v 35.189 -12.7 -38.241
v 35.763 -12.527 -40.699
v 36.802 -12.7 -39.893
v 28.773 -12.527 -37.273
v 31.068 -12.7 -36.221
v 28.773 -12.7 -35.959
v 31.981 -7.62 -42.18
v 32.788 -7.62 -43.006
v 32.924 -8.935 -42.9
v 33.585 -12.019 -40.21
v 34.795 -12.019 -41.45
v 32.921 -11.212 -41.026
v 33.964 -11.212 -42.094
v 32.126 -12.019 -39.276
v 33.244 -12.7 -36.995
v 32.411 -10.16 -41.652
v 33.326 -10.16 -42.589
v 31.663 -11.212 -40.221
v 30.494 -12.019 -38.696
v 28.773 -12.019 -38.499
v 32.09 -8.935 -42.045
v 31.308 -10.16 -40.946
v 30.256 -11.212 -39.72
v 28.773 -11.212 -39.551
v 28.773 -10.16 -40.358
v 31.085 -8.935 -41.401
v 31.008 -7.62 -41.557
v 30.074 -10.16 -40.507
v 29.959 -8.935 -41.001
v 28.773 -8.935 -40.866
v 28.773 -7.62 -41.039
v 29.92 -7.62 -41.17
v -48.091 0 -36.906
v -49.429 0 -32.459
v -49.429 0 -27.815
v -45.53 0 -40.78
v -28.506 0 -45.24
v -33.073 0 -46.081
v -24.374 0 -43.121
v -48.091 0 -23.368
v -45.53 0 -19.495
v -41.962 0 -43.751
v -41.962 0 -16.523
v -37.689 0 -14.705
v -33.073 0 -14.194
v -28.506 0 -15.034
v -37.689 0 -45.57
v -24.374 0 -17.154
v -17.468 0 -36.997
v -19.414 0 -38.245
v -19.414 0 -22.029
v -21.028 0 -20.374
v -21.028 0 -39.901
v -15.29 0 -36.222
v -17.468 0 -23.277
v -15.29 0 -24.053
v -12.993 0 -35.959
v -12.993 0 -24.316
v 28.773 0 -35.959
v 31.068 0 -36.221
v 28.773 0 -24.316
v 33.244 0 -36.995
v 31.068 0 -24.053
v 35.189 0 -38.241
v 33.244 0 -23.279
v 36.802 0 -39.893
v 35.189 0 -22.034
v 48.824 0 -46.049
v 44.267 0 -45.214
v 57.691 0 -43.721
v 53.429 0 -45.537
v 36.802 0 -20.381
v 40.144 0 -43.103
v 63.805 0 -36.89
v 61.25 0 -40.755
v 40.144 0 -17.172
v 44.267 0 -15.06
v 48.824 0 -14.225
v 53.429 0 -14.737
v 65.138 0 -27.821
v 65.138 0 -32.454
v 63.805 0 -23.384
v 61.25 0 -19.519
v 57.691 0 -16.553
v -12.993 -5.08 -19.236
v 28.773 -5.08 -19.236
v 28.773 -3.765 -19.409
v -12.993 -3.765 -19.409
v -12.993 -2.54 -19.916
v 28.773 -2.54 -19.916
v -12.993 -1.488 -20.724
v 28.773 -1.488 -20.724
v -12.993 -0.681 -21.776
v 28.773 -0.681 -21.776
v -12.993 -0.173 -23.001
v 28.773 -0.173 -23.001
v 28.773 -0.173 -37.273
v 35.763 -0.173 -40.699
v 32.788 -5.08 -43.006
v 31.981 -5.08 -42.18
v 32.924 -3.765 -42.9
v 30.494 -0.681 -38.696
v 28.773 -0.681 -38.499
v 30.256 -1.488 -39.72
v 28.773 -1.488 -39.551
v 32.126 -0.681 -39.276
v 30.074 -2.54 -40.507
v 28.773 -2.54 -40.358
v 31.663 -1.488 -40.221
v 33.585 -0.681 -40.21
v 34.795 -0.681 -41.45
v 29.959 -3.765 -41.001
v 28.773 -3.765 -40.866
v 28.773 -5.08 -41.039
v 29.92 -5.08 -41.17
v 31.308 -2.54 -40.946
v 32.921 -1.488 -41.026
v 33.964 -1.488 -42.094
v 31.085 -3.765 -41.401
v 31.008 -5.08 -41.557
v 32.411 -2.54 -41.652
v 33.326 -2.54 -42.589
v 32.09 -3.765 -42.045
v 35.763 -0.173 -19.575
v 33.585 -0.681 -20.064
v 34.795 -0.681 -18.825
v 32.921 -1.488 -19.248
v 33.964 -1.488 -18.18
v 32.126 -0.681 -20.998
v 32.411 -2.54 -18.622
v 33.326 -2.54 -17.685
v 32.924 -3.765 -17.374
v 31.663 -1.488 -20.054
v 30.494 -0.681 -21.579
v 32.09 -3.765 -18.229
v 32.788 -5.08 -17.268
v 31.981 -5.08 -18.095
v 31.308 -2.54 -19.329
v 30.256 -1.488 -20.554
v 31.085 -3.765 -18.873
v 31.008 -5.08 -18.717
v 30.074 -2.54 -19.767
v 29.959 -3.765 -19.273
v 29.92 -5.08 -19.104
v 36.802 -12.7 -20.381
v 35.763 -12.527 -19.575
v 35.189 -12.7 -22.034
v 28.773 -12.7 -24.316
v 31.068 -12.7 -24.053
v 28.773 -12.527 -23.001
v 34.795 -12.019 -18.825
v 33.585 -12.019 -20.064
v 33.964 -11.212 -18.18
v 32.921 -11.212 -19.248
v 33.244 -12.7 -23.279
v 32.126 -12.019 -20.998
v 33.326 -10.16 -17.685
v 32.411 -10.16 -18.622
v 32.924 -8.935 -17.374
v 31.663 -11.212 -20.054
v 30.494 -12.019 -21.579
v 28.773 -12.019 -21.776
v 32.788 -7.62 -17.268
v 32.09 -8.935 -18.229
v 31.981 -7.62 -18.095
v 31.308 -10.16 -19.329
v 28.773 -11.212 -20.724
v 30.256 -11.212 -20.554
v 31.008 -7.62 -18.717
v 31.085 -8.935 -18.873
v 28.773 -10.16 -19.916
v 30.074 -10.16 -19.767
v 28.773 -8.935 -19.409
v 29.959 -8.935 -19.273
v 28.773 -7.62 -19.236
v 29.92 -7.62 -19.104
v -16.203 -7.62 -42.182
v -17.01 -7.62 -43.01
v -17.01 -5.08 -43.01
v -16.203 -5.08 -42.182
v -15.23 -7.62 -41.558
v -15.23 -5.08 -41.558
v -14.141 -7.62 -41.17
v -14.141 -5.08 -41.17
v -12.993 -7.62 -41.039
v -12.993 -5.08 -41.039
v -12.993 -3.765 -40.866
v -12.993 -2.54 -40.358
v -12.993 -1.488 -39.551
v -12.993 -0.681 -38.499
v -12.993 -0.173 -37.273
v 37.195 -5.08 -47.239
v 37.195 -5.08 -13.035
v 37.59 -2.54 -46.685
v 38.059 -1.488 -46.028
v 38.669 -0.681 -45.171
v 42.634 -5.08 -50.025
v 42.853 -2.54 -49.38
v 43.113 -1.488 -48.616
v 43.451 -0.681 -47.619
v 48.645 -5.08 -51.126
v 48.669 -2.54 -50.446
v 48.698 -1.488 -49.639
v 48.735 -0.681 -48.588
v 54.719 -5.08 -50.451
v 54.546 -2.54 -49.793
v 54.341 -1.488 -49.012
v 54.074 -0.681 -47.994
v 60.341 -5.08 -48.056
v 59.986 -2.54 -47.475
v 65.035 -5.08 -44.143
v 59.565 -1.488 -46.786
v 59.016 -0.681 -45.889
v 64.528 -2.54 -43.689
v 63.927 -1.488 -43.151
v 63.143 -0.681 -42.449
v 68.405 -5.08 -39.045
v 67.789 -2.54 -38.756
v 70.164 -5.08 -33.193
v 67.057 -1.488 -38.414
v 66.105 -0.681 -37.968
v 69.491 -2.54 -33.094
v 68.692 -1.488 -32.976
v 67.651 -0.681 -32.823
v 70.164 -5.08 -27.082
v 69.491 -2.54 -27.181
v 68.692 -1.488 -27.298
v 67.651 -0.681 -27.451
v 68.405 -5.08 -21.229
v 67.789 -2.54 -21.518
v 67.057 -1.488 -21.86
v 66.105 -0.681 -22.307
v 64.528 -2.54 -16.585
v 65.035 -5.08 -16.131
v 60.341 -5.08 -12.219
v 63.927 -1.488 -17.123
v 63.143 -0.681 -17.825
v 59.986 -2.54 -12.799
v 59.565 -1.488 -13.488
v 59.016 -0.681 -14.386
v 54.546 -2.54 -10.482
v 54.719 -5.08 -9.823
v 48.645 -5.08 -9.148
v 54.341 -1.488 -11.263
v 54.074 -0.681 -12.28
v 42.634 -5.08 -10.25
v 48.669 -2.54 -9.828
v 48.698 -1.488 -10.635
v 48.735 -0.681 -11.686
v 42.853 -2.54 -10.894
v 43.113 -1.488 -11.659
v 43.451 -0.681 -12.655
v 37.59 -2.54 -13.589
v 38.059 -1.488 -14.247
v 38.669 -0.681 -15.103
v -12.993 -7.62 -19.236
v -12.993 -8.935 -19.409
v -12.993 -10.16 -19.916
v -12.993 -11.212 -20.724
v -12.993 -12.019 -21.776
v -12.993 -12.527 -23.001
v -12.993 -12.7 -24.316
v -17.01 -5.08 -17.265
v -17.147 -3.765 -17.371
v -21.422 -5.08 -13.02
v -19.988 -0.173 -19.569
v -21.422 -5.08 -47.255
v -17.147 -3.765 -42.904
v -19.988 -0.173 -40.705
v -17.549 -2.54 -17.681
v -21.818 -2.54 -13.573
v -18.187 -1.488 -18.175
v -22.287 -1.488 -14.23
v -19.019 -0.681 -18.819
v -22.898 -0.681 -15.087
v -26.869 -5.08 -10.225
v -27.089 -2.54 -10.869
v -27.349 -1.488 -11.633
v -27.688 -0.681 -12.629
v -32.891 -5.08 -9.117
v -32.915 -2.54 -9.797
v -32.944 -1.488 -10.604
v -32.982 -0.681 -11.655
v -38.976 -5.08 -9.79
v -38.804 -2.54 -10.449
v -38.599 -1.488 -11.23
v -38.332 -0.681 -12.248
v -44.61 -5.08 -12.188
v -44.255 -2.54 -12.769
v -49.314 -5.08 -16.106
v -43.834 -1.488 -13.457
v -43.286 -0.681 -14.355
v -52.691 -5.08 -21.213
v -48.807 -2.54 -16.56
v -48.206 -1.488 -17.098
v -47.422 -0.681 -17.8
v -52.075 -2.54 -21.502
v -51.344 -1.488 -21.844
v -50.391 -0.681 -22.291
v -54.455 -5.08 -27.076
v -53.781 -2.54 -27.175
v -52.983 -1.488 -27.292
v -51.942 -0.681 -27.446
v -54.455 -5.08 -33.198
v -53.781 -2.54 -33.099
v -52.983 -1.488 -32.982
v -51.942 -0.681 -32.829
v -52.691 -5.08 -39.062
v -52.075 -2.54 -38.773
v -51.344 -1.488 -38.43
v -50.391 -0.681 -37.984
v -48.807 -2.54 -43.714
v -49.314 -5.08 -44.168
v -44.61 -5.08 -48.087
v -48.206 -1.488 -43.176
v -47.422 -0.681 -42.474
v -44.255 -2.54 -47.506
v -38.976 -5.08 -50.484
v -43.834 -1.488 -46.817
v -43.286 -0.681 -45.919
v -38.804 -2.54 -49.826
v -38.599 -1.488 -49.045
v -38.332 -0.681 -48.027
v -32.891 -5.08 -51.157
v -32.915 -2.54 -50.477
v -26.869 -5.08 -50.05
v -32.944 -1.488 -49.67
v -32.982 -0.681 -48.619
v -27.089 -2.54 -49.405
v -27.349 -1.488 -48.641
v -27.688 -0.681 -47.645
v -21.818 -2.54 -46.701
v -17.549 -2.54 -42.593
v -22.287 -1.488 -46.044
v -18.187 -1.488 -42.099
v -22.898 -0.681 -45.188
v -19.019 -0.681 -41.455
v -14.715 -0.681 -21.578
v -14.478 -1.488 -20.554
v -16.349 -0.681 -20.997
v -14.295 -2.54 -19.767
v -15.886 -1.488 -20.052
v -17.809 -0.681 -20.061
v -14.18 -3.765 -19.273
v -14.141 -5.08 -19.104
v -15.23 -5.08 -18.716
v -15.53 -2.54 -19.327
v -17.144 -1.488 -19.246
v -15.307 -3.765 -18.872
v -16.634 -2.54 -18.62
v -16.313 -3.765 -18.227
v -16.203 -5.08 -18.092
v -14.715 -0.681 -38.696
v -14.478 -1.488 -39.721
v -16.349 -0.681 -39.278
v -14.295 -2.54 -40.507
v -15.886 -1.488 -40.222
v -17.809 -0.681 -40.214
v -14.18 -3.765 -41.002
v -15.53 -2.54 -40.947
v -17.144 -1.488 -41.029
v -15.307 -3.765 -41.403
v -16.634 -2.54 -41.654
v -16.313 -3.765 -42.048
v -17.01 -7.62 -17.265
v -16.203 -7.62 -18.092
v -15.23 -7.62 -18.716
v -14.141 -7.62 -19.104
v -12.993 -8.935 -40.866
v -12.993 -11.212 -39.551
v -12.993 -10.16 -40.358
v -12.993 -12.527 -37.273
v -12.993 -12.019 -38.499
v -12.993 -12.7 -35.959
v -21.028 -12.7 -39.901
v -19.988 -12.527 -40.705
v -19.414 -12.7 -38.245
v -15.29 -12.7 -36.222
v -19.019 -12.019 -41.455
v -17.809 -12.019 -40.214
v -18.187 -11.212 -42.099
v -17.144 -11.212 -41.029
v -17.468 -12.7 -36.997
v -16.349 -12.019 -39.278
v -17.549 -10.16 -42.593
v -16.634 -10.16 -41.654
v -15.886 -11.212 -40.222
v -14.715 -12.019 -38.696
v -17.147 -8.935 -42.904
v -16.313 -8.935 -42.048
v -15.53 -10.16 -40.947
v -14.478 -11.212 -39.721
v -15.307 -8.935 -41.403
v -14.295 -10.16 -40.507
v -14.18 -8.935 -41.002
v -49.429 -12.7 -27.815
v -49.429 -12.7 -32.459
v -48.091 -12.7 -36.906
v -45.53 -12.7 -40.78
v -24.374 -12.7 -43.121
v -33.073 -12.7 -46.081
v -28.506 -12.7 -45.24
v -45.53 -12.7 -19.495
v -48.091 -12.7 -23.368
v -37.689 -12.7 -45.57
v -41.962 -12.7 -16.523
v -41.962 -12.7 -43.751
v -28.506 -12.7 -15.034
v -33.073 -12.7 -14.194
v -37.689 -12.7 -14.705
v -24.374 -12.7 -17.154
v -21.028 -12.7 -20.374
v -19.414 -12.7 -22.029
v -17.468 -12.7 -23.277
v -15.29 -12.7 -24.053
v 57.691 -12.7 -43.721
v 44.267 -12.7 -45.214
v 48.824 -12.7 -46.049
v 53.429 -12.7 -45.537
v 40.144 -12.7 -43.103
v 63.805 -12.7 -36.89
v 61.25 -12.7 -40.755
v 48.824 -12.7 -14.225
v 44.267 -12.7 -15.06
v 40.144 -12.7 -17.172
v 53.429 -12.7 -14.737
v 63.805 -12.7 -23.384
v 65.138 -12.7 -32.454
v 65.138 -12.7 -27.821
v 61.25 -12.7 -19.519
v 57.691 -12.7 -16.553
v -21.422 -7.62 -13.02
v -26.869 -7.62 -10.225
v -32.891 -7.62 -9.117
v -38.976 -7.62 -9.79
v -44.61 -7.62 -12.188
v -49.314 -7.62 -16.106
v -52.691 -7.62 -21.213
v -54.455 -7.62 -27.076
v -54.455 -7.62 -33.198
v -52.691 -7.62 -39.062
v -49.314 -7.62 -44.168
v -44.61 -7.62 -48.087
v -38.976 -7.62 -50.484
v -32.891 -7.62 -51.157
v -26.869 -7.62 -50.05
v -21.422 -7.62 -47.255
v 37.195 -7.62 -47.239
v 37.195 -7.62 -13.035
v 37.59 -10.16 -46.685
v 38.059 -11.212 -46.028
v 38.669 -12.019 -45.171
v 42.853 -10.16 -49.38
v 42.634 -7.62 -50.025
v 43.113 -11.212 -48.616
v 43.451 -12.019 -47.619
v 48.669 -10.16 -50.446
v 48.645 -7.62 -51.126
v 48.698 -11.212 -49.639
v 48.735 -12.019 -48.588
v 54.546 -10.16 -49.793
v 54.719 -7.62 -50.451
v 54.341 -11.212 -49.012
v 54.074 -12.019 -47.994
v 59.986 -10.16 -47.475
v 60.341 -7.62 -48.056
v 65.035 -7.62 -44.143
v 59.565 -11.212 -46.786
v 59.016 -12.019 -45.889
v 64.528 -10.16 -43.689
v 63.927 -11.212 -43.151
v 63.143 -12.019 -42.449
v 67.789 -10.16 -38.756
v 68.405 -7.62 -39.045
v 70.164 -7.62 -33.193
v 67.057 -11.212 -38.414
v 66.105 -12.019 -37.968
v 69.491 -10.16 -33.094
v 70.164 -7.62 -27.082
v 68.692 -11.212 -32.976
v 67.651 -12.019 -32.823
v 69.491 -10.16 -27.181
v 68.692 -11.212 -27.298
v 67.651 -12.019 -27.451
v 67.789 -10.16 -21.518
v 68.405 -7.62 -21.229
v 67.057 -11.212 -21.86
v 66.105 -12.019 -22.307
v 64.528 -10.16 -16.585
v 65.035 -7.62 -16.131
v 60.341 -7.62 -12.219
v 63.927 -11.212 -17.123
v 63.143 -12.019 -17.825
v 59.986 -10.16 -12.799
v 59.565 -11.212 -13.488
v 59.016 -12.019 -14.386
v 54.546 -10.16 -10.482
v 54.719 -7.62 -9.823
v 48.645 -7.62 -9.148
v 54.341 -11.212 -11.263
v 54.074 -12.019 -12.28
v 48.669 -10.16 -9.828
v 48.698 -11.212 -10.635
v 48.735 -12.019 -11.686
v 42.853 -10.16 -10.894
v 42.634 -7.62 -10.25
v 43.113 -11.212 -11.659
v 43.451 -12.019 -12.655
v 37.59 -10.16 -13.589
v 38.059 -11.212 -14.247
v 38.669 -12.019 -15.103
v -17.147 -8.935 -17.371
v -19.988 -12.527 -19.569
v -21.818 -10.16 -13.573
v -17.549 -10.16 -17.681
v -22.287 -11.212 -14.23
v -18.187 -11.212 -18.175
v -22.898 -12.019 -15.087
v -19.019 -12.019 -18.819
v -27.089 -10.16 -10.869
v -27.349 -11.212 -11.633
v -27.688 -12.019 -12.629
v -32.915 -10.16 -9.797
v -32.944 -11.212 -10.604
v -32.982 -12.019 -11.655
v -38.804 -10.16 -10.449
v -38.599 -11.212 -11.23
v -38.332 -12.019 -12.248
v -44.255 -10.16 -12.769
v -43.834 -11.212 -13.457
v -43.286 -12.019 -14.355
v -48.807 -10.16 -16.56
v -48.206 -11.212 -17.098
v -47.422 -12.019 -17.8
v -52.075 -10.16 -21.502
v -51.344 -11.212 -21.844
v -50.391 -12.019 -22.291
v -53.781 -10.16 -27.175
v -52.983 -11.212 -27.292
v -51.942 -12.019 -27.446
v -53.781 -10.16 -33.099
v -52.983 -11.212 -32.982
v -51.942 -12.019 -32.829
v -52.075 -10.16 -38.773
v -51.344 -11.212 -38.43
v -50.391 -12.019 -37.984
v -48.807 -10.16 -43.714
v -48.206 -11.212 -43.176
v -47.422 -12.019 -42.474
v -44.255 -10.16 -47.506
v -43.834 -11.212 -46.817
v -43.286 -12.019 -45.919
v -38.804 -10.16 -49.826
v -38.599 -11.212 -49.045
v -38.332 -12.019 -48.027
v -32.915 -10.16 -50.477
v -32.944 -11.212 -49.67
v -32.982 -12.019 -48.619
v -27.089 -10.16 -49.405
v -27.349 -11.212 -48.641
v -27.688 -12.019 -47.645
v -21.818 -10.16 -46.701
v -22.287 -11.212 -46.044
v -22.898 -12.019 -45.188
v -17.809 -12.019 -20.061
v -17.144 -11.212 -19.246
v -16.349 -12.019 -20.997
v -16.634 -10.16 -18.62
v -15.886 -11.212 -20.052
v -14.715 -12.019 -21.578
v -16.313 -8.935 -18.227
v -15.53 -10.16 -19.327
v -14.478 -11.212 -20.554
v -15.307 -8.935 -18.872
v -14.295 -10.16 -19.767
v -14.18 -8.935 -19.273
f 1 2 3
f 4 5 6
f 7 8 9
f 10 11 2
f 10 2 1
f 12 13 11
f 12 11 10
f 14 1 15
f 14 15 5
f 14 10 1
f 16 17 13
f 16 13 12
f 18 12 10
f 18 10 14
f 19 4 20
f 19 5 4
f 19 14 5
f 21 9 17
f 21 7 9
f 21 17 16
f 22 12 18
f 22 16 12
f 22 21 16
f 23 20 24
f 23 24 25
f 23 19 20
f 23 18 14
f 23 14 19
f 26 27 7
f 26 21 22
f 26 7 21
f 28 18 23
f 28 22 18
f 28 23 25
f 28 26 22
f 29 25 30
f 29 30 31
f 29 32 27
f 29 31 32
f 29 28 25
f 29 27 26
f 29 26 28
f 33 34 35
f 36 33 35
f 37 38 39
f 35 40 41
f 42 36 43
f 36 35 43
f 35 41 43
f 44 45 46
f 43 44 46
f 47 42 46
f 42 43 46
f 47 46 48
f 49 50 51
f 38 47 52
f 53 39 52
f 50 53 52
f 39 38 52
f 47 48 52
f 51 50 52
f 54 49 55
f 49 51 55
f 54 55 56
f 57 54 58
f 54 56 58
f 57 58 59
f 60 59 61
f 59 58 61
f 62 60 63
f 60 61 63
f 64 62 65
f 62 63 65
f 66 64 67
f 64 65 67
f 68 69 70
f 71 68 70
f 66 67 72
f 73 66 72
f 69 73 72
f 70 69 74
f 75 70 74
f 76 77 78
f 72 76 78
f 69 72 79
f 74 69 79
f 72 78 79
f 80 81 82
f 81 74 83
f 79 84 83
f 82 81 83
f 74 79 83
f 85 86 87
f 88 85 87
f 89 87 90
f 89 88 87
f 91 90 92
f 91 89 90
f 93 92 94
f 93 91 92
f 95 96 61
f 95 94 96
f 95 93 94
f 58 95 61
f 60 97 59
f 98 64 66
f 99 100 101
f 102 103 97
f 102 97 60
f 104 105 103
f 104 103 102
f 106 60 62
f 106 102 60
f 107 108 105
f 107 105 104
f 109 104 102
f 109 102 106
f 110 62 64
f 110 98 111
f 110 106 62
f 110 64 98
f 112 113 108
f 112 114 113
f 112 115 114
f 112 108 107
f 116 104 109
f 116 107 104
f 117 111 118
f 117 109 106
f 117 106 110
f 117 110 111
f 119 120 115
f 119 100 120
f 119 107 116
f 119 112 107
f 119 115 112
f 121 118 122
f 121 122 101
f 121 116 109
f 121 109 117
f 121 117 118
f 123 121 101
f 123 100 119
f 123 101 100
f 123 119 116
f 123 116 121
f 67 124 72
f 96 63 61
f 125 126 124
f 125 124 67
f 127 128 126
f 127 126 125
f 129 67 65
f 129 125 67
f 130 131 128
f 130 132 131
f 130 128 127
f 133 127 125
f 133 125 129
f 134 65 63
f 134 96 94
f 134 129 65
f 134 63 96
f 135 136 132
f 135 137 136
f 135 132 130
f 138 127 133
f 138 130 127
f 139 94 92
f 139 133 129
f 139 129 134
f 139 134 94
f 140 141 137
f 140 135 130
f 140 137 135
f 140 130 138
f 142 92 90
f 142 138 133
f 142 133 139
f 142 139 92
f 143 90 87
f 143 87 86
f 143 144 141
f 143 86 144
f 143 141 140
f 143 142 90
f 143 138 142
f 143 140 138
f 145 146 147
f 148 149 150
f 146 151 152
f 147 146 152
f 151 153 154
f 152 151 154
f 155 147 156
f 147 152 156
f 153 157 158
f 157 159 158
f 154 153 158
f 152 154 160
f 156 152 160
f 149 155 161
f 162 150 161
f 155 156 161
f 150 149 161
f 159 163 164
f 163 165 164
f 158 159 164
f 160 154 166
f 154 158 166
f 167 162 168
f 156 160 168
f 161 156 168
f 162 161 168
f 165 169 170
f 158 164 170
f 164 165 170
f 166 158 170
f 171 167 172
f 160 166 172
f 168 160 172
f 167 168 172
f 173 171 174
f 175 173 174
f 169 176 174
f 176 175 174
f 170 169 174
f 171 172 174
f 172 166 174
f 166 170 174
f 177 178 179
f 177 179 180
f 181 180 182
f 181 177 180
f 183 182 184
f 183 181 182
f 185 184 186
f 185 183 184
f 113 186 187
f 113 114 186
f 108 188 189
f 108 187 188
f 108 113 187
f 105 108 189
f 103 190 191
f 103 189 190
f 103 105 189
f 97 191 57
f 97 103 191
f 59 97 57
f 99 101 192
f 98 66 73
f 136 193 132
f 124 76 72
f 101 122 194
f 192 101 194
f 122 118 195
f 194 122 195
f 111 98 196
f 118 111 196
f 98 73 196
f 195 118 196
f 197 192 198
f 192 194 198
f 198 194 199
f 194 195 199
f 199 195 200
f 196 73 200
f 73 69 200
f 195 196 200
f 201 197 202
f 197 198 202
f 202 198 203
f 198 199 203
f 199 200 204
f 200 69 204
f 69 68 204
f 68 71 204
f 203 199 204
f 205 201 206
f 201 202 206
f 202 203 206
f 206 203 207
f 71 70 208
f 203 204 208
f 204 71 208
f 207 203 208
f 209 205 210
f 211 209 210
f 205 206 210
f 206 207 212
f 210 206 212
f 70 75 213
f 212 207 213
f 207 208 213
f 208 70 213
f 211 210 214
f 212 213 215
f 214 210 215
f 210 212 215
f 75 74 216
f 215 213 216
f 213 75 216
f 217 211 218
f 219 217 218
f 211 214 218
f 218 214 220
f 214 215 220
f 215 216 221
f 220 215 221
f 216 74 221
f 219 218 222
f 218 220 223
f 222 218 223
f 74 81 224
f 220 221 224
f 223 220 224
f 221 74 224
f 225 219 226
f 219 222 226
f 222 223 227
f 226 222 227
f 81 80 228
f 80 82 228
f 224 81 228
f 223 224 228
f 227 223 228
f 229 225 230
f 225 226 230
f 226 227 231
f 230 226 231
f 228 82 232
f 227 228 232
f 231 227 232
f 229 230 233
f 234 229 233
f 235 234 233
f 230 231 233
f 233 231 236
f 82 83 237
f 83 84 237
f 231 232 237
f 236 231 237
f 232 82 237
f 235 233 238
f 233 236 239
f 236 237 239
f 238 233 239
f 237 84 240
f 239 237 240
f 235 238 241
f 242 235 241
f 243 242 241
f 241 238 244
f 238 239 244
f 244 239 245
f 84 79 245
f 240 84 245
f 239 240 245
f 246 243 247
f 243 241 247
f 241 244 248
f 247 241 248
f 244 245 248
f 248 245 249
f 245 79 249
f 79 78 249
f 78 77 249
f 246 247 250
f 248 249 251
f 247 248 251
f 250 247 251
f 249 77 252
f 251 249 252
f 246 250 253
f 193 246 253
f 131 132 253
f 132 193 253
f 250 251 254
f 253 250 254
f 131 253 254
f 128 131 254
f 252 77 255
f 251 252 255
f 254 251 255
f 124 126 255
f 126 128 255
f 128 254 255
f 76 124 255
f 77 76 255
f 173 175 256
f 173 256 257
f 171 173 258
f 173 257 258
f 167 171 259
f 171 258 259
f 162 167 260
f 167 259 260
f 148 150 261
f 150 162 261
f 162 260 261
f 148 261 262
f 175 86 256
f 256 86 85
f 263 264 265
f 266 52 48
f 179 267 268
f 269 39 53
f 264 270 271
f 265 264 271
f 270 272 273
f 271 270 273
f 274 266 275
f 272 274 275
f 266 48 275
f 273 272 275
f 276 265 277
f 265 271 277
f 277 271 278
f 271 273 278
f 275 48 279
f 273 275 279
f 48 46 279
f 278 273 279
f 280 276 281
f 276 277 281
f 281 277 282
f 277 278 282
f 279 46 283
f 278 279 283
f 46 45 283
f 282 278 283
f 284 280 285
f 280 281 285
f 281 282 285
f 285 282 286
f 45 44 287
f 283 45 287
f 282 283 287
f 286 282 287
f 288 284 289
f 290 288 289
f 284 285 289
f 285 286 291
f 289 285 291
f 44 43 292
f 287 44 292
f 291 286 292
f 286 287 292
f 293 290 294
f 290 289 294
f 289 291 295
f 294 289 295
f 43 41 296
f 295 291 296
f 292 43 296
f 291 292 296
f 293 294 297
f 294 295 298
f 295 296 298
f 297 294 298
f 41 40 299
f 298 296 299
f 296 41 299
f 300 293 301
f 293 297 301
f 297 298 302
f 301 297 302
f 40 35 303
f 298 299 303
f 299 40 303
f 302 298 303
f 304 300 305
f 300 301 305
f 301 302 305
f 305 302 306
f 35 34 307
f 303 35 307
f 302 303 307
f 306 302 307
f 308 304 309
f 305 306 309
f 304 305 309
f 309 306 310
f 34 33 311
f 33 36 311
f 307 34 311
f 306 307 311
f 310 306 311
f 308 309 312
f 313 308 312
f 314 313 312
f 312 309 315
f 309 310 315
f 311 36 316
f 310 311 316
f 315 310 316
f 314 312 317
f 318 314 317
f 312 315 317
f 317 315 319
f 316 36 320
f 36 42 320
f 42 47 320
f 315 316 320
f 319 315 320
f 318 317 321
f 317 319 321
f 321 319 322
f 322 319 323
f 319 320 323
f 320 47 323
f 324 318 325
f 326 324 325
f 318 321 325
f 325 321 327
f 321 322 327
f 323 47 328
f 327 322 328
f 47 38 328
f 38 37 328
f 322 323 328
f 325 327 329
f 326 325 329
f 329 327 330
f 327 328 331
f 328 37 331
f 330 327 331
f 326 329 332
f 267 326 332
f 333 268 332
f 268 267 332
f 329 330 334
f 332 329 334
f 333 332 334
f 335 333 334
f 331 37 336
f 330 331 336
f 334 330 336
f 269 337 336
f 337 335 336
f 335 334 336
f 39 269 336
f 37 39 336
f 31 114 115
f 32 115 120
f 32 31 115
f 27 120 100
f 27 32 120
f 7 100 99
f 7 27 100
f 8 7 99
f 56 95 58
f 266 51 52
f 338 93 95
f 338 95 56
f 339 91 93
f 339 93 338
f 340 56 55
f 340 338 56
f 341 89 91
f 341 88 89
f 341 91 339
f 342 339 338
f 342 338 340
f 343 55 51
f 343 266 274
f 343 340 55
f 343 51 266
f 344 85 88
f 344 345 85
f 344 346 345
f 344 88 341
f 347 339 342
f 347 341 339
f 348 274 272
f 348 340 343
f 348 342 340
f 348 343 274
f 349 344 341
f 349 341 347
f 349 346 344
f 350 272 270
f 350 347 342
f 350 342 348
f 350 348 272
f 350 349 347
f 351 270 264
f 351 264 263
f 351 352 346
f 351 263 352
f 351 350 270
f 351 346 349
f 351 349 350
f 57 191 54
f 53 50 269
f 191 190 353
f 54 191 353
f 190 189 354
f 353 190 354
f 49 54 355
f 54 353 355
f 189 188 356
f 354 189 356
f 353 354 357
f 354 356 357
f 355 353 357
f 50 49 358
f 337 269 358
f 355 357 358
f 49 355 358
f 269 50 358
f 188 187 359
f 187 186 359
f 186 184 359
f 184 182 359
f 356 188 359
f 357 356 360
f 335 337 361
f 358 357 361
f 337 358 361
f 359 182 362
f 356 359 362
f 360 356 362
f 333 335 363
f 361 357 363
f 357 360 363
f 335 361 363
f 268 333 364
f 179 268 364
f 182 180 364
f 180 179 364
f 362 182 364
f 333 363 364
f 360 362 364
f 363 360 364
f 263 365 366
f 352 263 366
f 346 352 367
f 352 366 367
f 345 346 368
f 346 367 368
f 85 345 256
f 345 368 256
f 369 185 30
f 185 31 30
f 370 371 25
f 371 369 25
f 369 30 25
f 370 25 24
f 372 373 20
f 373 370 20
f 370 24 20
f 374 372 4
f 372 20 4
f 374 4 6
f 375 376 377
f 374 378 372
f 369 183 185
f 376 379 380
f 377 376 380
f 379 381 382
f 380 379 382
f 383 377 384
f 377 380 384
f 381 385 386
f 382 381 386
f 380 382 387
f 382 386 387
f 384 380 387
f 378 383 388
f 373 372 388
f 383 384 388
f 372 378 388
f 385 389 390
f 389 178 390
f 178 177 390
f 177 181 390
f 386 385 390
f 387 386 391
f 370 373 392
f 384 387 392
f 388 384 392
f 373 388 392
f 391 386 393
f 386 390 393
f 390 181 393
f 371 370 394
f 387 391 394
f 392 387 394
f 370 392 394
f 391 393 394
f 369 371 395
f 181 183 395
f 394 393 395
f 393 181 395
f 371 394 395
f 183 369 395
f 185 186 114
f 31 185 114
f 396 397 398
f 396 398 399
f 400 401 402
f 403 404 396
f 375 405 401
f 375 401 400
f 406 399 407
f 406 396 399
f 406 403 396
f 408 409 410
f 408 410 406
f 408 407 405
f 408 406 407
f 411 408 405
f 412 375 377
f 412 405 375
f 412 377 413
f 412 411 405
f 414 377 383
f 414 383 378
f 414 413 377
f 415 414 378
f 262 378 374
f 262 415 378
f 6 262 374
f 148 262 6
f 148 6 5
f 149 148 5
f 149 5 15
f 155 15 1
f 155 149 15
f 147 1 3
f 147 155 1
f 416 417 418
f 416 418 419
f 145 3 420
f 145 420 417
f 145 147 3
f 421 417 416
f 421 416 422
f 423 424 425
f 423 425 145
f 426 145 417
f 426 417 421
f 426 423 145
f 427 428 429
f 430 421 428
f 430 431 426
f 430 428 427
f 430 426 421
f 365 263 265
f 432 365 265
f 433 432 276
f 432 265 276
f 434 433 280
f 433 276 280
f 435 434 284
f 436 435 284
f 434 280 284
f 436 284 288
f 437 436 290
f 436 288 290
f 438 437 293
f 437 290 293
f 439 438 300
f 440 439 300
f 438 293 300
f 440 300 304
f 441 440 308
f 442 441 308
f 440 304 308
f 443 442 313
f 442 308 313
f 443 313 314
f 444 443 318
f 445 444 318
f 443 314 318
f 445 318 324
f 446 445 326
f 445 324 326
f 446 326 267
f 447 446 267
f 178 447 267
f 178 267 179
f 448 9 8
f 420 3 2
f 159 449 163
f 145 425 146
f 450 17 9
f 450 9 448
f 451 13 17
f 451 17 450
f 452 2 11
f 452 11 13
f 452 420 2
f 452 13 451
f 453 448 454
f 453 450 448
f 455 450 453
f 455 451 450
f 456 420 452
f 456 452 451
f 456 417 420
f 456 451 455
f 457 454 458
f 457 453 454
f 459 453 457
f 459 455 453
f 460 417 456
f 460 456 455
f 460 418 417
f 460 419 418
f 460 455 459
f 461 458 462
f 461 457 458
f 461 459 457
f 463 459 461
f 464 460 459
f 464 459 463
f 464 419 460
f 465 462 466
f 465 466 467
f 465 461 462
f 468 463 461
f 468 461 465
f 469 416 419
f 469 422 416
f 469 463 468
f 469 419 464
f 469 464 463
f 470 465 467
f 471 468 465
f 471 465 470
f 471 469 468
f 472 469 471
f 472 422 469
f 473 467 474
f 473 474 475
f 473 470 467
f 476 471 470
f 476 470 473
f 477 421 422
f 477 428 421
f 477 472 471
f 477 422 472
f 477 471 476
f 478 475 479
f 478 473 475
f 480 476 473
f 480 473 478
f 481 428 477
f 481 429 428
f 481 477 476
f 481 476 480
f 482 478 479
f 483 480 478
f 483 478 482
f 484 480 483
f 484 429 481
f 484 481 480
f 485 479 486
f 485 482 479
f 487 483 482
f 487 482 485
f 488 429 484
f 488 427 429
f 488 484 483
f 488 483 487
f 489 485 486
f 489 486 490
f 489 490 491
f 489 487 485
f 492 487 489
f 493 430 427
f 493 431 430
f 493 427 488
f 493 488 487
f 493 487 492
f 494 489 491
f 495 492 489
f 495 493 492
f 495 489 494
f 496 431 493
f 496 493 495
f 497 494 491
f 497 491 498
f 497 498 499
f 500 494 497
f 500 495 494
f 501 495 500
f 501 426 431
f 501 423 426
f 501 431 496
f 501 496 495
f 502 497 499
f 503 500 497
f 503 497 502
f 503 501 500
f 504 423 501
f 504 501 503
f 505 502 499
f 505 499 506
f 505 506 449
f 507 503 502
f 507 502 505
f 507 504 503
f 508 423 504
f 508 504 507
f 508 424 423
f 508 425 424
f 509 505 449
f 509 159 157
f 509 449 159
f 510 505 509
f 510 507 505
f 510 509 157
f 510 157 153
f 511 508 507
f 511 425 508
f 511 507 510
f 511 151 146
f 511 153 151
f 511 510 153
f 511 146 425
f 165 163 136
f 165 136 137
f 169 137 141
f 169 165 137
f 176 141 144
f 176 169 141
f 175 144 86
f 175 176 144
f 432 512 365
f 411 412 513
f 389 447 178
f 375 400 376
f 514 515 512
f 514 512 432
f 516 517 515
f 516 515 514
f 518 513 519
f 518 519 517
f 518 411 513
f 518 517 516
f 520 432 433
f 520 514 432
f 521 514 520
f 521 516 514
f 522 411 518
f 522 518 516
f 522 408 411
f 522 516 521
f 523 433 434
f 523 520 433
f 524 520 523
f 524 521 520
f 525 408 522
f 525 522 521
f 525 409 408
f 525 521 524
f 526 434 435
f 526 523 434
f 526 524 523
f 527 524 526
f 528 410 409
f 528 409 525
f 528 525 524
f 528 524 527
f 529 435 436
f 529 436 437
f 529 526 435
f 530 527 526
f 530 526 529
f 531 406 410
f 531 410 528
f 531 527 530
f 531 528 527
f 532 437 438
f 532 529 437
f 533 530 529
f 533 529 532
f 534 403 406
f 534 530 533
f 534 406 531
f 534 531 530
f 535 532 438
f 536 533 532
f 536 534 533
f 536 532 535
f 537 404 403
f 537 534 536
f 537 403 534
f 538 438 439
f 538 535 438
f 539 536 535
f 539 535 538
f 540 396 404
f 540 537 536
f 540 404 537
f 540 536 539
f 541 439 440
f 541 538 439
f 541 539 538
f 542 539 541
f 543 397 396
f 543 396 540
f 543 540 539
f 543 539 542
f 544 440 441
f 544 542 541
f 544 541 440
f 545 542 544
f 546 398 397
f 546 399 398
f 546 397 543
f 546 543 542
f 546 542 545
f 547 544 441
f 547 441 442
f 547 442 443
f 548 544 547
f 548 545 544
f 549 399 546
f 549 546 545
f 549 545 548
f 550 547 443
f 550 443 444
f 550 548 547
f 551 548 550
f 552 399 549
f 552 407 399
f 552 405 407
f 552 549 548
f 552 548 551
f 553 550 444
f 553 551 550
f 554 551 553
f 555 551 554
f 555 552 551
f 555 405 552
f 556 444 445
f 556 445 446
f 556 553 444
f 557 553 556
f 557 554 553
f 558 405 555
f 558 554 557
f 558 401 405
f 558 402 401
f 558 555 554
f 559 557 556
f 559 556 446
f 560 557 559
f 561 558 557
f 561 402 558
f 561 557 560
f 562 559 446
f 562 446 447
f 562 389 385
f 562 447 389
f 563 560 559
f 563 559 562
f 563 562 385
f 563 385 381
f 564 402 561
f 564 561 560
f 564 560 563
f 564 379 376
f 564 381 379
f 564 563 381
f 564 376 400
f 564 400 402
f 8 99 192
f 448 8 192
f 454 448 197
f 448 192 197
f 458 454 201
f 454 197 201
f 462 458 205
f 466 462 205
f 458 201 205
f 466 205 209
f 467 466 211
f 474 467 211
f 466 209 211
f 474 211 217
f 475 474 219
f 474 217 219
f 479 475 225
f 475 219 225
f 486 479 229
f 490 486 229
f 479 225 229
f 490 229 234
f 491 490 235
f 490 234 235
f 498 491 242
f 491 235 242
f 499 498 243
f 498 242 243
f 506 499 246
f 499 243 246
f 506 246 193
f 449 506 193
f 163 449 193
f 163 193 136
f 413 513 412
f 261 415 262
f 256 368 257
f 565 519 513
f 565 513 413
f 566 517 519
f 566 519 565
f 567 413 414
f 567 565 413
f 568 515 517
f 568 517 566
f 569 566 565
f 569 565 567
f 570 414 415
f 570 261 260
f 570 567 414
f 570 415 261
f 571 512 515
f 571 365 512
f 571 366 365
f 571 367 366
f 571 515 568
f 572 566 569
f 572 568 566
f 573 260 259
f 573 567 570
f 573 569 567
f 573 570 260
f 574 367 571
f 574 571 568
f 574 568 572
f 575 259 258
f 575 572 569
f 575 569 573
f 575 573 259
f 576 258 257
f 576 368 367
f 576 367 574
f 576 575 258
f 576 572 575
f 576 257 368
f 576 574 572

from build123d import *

# Parameters (mm, degrees)
F1_DEPTH = 12.7
F2_R     = 5.08


with BuildPart() as f1:
    # F0 (on Front) → F1 (new body)
    with BuildSketch(Plane.XZ):
        with BuildLine():
            Line((-28.5442825407, -19.2357096821), (-15.6568741476, -19.2357096821))
            ThreePointArc((-15.6568741476, -19.2357096821), (-54.678540264, -30.1371803507), (-15.6568741476, -41.0386510193))
            Line((-15.6568741476, -41.0386510193), (-28.5442825407, -41.0386510193))
            Line((-28.5442825407, -41.0386510193), (-28.5442825407, -19.2357096821))
        make_face()
        with BuildLine():
            Line((42.9155228194, -41.0386510193), (42.9155228194, -19.2357096821))
            Line((42.9155228194, -19.2357096821), (31.4341556288, -19.2357096821))
            ThreePointArc((31.4341556288, -19.2357096821), (28.3832827885, -30.1371803507), (31.4341556288, -41.0386510193))
            Line((31.4341556288, -41.0386510193), (42.9155228194, -41.0386510193))
        make_face()
        with BuildLine():
            ThreePointArc((31.4341556288, -41.0386510193), (28.3832827885, -30.1371803507), (31.4341556288, -19.2357096821))
            Line((31.4341556288, -19.2357096821), (-15.6568741476, -19.2357096821))
            ThreePointArc((-15.6568741476, -19.2357096821), (-13.3870219255, -24.4777329529), (-12.6113336936, -30.1371803507))
            ThreePointArc((-12.6113336936, -30.1371803507), (-13.3870219255, -35.7966277486), (-15.6568741476, -41.0386510193))
            Line((-15.6568741476, -41.0386510193), (31.4341556288, -41.0386510193))
        make_face()
        with BuildLine():
            ThreePointArc((-12.6113336936, -30.1371803507), (-13.3870219255, -24.4777329529), (-15.6568741476, -19.2357096821))
            Line((-15.6568741476, -19.2357096821), (-28.5442825407, -19.2357096821))
            Line((-28.5442825407, -19.2357096821), (-28.5442825407, -41.0386510193))
            Line((-28.5442825407, -41.0386510193), (-15.6568741476, -41.0386510193))
            ThreePointArc((-15.6568741476, -41.0386510193), (-13.3870219255, -35.7966277486), (-12.6113336936, -30.1371803507))
        make_face()
        with BuildLine():
            Line((31.4341556288, -19.2357096821), (42.9155228194, -19.2357096821))
            Line((42.9155228194, -19.2357096821), (42.9155228194, -41.0386510193))
            Line((42.9155228194, -41.0386510193), (31.4341556288, -41.0386510193))
            ThreePointArc((31.4341556288, -41.0386510193), (55.0456161452, -50.3622536115), (70.3876187723, -30.1371803507))
            ThreePointArc((70.3876187723, -30.1371803507), (55.0456161452, -9.91210709), (31.4341556288, -19.2357096821))
        make_face()
    extrude(amount=F1_DEPTH)

    # F2
    f2_edges = [f1.edges().sort_by_distance(p)[0] for p in [
        (-54.67854, 0, -30.13718),
        (-15.656874, -6.35, -19.23571),
        (-15.656874, -6.35, -41.038651),
        (-54.67854, -12.7, -30.13718),
        (7.888641, 0, -41.038651),
        (70.387619, 0, -30.13718),
        (7.888641, 0, -19.23571),
        (31.434156, -6.35, -41.038651),
        (31.434156, -6.35, -19.23571),
        (70.387619, -12.7, -30.13718),
        (7.888641, -12.7, -41.038651),
        (7.888641, -12.7, -19.23571),
    ]]
    fillet(f2_edges, radius=F2_R)


solid = f1.part
